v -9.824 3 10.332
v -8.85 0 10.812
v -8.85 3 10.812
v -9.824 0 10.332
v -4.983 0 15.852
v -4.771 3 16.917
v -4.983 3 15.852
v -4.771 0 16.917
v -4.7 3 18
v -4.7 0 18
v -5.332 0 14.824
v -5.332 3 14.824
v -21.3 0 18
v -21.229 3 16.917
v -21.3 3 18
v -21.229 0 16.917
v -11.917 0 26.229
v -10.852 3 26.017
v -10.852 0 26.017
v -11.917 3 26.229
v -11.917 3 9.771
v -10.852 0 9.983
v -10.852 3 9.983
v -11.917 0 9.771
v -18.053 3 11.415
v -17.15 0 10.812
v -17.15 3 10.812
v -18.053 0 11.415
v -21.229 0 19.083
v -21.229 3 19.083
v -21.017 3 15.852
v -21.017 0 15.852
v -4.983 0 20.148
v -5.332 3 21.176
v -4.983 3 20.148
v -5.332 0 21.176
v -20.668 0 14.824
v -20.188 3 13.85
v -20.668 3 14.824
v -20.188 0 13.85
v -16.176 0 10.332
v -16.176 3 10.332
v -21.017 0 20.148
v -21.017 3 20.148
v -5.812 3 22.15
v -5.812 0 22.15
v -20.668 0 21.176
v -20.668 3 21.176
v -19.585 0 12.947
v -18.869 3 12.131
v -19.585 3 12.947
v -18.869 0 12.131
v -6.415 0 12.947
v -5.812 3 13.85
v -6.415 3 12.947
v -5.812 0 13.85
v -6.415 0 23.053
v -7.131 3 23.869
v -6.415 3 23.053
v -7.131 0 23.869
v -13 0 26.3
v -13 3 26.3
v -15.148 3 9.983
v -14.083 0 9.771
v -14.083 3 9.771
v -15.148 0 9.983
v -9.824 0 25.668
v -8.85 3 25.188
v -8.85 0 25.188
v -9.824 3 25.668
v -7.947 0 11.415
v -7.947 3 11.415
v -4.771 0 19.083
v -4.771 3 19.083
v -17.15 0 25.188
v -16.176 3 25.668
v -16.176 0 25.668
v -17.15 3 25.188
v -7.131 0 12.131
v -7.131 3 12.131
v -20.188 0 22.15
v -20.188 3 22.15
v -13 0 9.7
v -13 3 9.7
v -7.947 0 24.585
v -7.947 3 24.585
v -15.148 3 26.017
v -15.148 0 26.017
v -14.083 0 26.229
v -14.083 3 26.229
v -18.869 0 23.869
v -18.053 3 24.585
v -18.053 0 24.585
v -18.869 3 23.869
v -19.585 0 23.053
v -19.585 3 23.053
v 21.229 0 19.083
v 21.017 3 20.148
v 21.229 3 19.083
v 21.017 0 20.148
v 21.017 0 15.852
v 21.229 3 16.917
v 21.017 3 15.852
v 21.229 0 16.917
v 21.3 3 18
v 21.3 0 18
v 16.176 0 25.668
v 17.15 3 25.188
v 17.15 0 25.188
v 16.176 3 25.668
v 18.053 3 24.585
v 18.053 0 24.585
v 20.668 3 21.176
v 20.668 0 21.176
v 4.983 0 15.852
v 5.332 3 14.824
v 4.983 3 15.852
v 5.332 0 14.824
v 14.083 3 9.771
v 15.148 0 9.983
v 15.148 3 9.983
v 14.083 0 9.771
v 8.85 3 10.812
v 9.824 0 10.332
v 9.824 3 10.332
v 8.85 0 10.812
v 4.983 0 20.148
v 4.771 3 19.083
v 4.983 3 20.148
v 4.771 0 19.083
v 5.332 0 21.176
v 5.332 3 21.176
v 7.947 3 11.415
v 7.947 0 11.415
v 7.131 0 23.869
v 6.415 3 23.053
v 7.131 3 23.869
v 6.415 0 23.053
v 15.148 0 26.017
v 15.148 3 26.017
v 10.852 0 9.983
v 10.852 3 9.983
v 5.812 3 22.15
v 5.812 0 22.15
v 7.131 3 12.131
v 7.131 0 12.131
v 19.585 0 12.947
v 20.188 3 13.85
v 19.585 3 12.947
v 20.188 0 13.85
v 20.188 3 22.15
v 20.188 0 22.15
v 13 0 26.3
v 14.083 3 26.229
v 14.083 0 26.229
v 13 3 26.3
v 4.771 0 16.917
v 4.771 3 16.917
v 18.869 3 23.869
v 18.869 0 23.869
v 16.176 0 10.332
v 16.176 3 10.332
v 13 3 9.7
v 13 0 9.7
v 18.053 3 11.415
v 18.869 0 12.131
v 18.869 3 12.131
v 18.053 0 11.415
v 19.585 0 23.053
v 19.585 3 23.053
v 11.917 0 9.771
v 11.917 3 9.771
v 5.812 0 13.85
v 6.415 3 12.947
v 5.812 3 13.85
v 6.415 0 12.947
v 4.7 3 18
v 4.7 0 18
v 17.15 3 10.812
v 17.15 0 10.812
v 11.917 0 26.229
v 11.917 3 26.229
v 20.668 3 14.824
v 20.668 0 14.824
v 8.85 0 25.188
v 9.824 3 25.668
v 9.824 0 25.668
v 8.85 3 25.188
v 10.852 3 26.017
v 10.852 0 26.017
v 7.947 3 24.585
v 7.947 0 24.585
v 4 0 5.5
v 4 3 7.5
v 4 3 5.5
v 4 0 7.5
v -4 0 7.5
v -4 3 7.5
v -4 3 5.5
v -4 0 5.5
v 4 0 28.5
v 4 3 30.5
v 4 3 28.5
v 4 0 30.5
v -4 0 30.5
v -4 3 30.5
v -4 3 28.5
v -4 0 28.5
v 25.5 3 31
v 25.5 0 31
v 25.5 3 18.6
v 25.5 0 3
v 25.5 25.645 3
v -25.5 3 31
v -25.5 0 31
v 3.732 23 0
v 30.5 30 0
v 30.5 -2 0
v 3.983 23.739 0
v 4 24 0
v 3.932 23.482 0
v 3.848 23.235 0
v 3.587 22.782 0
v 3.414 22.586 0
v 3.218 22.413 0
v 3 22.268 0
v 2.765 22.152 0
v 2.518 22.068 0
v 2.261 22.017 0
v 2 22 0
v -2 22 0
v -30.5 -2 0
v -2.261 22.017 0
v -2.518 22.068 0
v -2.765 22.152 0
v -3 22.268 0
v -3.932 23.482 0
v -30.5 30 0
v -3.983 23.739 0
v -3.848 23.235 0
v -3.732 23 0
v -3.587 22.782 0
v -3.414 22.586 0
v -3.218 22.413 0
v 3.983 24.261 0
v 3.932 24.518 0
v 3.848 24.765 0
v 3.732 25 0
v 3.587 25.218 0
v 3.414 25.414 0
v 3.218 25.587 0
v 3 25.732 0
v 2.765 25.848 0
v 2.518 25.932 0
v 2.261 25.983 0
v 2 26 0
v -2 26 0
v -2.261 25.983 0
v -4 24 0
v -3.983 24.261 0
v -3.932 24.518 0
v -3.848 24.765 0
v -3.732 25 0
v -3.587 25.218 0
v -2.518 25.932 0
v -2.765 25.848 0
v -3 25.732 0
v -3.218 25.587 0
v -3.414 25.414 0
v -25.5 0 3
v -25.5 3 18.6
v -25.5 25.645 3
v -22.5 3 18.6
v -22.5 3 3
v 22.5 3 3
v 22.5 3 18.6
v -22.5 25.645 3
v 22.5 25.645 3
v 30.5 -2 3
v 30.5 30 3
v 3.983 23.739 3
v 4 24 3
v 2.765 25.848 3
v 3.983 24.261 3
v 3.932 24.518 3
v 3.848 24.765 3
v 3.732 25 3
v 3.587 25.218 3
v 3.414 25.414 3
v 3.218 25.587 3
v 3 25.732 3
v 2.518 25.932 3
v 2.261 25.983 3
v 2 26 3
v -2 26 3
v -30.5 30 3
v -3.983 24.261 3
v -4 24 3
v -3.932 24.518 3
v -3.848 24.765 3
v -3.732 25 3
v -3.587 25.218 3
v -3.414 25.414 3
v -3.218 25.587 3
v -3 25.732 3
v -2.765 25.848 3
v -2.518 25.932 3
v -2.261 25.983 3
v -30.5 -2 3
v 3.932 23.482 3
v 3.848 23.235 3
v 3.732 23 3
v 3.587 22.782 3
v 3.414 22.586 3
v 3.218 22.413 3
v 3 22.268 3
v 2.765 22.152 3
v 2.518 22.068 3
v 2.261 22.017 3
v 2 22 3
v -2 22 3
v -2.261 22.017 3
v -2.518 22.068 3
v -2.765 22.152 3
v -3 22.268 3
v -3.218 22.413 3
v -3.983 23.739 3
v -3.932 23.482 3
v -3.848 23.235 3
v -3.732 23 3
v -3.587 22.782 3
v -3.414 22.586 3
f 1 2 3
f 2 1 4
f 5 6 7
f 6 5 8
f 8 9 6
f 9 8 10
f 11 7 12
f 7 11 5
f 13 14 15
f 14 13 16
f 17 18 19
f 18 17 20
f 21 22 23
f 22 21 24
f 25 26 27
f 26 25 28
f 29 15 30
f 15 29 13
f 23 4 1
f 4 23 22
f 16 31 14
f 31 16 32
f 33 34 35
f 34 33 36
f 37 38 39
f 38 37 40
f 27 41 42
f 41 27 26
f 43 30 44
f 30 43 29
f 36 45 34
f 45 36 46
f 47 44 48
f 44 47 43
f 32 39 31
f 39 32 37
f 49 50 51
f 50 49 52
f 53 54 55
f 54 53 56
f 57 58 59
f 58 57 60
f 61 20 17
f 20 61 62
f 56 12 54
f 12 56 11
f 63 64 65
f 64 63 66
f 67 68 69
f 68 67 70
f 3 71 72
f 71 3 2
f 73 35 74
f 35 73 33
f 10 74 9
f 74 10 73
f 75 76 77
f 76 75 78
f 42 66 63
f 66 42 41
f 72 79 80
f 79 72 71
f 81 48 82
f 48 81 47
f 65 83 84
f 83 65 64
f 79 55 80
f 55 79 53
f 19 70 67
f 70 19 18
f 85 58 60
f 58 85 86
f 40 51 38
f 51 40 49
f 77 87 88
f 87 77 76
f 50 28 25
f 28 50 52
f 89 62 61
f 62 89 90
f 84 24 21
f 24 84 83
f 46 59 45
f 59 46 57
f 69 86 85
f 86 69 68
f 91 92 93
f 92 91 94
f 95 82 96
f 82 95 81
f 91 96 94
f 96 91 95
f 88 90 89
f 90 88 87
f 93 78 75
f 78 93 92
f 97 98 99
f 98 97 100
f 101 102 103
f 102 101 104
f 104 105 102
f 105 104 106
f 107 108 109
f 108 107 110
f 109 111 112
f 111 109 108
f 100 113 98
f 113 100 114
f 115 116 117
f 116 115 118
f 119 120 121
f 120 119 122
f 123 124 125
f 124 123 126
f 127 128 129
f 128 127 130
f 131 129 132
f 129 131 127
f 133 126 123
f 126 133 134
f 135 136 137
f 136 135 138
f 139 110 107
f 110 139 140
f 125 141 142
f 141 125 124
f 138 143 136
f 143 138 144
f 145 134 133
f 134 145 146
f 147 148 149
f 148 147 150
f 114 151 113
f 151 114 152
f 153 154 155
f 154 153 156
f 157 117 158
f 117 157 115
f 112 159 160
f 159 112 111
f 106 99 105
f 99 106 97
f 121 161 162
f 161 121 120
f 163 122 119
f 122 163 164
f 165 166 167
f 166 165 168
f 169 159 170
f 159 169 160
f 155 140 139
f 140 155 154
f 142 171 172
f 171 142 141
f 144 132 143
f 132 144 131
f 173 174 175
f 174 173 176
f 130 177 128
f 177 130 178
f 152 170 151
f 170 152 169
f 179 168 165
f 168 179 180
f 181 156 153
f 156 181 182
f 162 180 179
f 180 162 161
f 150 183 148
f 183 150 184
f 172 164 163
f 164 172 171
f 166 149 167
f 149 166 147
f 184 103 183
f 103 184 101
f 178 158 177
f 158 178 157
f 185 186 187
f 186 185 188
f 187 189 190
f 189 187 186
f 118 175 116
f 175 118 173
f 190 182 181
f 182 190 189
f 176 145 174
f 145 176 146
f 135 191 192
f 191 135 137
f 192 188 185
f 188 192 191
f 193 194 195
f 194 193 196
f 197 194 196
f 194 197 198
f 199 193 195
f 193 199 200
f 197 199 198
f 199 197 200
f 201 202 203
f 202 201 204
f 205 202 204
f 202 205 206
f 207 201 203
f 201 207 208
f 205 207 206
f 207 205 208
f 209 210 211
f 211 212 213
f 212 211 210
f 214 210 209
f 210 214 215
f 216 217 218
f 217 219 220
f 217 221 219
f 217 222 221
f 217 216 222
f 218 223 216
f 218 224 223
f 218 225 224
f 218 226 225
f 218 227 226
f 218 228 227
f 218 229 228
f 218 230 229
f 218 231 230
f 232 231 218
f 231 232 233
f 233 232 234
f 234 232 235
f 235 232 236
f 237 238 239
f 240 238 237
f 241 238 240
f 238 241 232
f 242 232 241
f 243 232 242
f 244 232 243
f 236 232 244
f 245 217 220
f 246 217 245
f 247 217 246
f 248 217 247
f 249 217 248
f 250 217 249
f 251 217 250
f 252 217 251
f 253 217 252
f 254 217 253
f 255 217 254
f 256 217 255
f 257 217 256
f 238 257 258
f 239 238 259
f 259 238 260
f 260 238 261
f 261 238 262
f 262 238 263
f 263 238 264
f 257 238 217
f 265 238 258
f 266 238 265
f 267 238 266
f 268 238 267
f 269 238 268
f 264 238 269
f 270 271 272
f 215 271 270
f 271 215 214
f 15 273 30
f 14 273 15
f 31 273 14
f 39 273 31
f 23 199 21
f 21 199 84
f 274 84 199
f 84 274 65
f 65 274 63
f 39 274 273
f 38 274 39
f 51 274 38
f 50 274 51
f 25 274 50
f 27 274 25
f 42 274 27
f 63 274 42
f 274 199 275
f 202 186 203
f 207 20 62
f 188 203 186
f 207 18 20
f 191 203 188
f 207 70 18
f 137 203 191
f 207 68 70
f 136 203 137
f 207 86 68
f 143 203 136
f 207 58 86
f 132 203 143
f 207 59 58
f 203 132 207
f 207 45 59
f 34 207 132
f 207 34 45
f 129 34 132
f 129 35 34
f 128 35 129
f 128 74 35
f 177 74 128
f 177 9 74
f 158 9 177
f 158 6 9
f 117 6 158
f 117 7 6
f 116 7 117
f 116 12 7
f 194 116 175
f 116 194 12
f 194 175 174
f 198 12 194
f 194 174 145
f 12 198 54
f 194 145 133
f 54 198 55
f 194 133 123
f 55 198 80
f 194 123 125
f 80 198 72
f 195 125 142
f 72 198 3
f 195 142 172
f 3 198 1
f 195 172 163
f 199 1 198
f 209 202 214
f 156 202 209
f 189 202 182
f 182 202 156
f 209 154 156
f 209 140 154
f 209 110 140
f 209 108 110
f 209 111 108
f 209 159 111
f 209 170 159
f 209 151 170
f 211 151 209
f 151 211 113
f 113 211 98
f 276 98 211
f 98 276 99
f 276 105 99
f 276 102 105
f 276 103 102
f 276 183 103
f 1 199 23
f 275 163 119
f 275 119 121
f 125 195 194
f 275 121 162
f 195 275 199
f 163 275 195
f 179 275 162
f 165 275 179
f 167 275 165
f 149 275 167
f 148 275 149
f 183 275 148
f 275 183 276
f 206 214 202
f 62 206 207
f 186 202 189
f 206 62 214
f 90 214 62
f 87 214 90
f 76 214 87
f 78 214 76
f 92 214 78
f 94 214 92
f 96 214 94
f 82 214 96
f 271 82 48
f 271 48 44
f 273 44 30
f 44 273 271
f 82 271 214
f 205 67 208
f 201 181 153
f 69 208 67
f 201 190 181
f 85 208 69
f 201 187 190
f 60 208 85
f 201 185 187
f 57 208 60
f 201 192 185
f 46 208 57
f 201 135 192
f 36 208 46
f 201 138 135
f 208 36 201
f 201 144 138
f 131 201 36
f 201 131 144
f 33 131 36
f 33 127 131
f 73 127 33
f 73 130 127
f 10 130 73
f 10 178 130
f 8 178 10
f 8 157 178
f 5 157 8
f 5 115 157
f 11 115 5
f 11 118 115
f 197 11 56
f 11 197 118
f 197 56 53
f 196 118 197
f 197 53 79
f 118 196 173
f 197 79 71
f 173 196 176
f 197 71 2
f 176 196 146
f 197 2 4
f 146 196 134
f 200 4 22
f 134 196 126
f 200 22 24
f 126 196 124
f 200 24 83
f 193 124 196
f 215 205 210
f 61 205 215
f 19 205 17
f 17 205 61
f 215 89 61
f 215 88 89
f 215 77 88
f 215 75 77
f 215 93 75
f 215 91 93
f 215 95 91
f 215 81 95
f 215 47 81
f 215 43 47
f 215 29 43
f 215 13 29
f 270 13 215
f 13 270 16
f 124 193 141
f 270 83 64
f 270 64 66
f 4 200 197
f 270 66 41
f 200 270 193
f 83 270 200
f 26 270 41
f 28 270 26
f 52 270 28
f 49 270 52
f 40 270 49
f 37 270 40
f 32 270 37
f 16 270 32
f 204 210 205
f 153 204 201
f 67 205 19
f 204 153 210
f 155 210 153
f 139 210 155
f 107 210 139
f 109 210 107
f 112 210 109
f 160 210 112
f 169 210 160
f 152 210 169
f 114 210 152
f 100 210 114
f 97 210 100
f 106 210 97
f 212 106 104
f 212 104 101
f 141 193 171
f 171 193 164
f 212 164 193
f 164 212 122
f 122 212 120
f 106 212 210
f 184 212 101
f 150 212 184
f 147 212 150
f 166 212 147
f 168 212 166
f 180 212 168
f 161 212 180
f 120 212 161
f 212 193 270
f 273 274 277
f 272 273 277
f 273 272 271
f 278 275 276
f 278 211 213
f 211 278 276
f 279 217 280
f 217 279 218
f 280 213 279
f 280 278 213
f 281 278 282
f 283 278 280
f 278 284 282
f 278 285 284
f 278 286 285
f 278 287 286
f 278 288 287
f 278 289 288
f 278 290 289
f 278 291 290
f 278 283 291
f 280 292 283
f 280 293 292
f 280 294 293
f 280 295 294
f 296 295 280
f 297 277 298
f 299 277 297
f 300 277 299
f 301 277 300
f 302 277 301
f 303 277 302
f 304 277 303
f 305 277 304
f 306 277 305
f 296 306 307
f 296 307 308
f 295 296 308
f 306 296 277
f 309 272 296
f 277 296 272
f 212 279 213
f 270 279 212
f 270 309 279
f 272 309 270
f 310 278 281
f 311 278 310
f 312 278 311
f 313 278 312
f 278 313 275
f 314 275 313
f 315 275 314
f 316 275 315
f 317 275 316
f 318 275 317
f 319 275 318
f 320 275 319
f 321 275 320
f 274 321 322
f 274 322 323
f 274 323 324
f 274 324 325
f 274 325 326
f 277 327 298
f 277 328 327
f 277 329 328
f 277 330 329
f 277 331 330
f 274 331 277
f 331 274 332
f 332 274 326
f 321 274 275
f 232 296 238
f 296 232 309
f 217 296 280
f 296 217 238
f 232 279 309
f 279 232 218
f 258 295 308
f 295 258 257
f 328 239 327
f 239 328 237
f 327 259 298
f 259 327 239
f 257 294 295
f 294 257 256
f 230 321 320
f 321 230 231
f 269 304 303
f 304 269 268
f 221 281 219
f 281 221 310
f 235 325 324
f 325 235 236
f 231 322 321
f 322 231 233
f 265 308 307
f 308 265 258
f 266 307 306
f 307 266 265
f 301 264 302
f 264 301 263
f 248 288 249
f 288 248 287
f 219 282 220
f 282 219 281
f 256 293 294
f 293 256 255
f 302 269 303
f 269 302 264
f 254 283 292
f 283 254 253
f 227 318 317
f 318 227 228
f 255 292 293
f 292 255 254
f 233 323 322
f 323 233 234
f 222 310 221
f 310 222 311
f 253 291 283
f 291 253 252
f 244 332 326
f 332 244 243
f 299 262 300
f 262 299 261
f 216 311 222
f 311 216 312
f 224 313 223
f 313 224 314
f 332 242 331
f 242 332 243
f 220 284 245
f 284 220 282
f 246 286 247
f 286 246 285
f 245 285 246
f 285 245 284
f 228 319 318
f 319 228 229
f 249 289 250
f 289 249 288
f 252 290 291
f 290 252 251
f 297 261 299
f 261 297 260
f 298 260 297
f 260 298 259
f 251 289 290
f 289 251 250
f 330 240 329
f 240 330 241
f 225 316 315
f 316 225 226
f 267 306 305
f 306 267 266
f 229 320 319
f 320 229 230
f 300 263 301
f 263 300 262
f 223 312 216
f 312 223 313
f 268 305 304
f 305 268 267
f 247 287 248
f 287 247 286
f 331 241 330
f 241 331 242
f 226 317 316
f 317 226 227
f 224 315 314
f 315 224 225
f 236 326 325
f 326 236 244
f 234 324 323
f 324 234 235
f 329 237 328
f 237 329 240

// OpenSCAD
// file: common.scad
// common.scad - shared helpers for the Smart Campus Robot printed parts.
// NOTHING IN THIS DIRECTORY IS VERIFIED. No dimension has been measured.
// Mounting to the Rover 5 deck is by glue / double-sided tape / zip ties only.

$fn = 48;

// Global print/fit values (apply to every part that includes this file)
fit_clearance = 0.3;   // mm, added to pockets for a slip fit; guess (typical FDM) // VERIFY WITH CALIPERS (test print)
zip_w         = 4.0;   // mm, zip-tie slot width; guess for 3.6 mm ties          // VERIFY WITH CALIPERS
zip_h         = 2.0;   // mm, zip-tie slot height; guess for 1.1-1.5 mm ties     // VERIFY WITH CALIPERS
corner_r      = 2.0;   // mm, outer corner radius; cosmetic choice

// Rounded rectangle plate, origin at the centre of the bottom face.
module rounded_plate(x, y, h, r = corner_r) {
    rr = min(r, x / 2 - 0.01, y / 2 - 0.01);
    translate([-x / 2 + rr, -y / 2 + rr, 0])
        linear_extrude(h)
            offset(r = rr) square([x - 2 * rr, y - 2 * rr]);
}

// Through-slot for a zip tie / strap, centred at origin, long axis along X.
module strap_slot(len, wid, h) {
    translate([0, 0, -1])
        linear_extrude(h + 2)
            hull() {
                translate([-(len - wid) / 2, 0]) circle(d = wid);
                translate([ (len - wid) / 2, 0]) circle(d = wid);
            }
}

// Pair of zip-tie slots, spaced `pitch` apart along Y, cut through height h.
module zip_pair(pitch, h) {
    for (s = [-1, 1])
        translate([0, s * pitch / 2, 0]) strap_slot(zip_w * 2, zip_h * 2, h);
}

// Simple round standoff with a hole (for self-tapping or heat-set insert).
module standoff(od, id, h) {
    difference() {
        cylinder(d = od, h = h);
        translate([0, 0, -1]) cylinder(d = id, h = h + 2);
    }
}
// main file
// hcsr04_holder.scad - holder for one HC-SR04 ultrasonic module.
// NOTHING HERE IS VERIFIED. Every dimension below is nominal or a guess.
//
// One part, printed 4 times:
//   front-left   yaw_deg = +25   (or print the 0 part and glue it turned 25 deg)
//   front-centre yaw_deg =   0
//   front-right  yaw_deg = -25   (the mirror of +25; set yaw_deg = -25)
//   rear         yaw_deg =   0
// yaw_deg turns the sensor face relative to the base's straight edge, so the
// base can be glued square to the deck edge and the sensor still points at
// the angle. Render a variant with:  openscad -D yaw_deg=25 ...
// Mounting to the Rover 5 deck: glue / double-sided tape, or a zip tie through
// the base slot. The module is held by its two transducer cans in the face
// holes plus a zip tie through the face slots. No screws, no drilling.
include <common.scad>

yaw_deg      = 0;      // deg; -25 / 0 / +25 front, 0 rear (docs/HARDWARE.md layout)

// ---- HC-SR04 (nominal: ElecFreaks "HC-SR04 Ultrasonic Ranging Module" user guide, 45x20x15 mm) ----
pcb_x        = 45.0;   // mm; ElecFreaks HC-SR04 user guide                     // VERIFY WITH CALIPERS
pcb_y        = 20.0;   // mm; ElecFreaks HC-SR04 user guide                     // VERIFY WITH CALIPERS
pcb_t        = 1.6;    // mm; guess (standard FR4)                              // VERIFY WITH CALIPERS
can_d        = 16.0;   // mm, transducer can diameter; guess (clones vary)     // VERIFY WITH CALIPERS
can_pitch    = 26.0;   // mm, centre-to-centre of the two cans; guess          // VERIFY WITH CALIPERS
can_h        = 12.0;   // mm, can height above the PCB; guess                  // VERIFY WITH CALIPERS
pin_clear_z  = 4.0;    // mm, header pins stick out of the bottom edge; guess   // VERIFY WITH CALIPERS

// ---- Holder ----
face_t       = 3.0;    // mm, front face thickness (cans pass through); guess   // VERIFY WITH CALIPERS
face_margin  = 3.0;    // mm around the PCB outline; guess                      // VERIFY WITH CALIPERS
base_d       = 30.0;   // mm, base depth (glue area); guess                     // VERIFY WITH CALIPERS
base_t       = 3.0;    // mm; guess                                             // VERIFY WITH CALIPERS
sensor_z     = 8.0;    // mm, PCB bottom edge above the deck (pin clearance); guess // VERIFY WITH CALIPERS
gusset_t     = 3.0;    // mm; guess                                             // VERIFY WITH CALIPERS

face_x = pcb_x + 2 * face_margin;
face_h = sensor_z + pcb_y + face_margin;
base_x = face_x / cos(yaw_deg) + 10;   // wide enough to carry the turned face
base_front = face_x / 2 * abs(sin(yaw_deg)) + 2;  // base reaches the forward face corner

module face() {
    // XZ plate, front surface at y = 0, sensor looks toward -Y
    difference() {
        translate([-face_x / 2, 0, 0]) cube([face_x, face_t, face_h]);
        // transducer holes
        for (s = [-1, 1])
            translate([s * can_pitch / 2, -1, sensor_z + pcb_y / 2])
                rotate([-90, 0, 0]) cylinder(d = can_d + 2 * fit_clearance, h = face_t + 2);
        // zip-tie slots above and below the cans, tie goes around the PCB
        for (s = [-1, 1])
            translate([0, face_t / 2, sensor_z + pcb_y / 2 + s * (pcb_y / 2 + 1.5)])
                cube([zip_w * 2, face_t + 2, zip_h], center = true);
    }
    // side gussets
    for (s = [-1, 1])
        translate([s * (face_x / 2 - gusset_t / 2) - gusset_t / 2, face_t, 0])
            rotate([90, 0, 90])
                linear_extrude(gusset_t)
                    polygon([[0, 0], [base_d - face_t, 0], [0, face_h * 0.6]]);
}

module hcsr04_holder() {
    difference() {
        union() {
            // base, its front edge along X is the edge glued square to the deck edge
            translate([-base_x / 2, -base_front, 0]) cube([base_x, base_d + base_front, base_t]);
            rotate([0, 0, yaw_deg]) face();
        }
        // base zip-tie slot
        translate([0, base_d - 6, 0]) strap_slot(zip_w * 2, zip_h * 2, base_t);
        // keep the face from poking below the deck
        translate([-200, -200, -50]) cube([400, 400, 50]);
    }
}

hcsr04_holder();
